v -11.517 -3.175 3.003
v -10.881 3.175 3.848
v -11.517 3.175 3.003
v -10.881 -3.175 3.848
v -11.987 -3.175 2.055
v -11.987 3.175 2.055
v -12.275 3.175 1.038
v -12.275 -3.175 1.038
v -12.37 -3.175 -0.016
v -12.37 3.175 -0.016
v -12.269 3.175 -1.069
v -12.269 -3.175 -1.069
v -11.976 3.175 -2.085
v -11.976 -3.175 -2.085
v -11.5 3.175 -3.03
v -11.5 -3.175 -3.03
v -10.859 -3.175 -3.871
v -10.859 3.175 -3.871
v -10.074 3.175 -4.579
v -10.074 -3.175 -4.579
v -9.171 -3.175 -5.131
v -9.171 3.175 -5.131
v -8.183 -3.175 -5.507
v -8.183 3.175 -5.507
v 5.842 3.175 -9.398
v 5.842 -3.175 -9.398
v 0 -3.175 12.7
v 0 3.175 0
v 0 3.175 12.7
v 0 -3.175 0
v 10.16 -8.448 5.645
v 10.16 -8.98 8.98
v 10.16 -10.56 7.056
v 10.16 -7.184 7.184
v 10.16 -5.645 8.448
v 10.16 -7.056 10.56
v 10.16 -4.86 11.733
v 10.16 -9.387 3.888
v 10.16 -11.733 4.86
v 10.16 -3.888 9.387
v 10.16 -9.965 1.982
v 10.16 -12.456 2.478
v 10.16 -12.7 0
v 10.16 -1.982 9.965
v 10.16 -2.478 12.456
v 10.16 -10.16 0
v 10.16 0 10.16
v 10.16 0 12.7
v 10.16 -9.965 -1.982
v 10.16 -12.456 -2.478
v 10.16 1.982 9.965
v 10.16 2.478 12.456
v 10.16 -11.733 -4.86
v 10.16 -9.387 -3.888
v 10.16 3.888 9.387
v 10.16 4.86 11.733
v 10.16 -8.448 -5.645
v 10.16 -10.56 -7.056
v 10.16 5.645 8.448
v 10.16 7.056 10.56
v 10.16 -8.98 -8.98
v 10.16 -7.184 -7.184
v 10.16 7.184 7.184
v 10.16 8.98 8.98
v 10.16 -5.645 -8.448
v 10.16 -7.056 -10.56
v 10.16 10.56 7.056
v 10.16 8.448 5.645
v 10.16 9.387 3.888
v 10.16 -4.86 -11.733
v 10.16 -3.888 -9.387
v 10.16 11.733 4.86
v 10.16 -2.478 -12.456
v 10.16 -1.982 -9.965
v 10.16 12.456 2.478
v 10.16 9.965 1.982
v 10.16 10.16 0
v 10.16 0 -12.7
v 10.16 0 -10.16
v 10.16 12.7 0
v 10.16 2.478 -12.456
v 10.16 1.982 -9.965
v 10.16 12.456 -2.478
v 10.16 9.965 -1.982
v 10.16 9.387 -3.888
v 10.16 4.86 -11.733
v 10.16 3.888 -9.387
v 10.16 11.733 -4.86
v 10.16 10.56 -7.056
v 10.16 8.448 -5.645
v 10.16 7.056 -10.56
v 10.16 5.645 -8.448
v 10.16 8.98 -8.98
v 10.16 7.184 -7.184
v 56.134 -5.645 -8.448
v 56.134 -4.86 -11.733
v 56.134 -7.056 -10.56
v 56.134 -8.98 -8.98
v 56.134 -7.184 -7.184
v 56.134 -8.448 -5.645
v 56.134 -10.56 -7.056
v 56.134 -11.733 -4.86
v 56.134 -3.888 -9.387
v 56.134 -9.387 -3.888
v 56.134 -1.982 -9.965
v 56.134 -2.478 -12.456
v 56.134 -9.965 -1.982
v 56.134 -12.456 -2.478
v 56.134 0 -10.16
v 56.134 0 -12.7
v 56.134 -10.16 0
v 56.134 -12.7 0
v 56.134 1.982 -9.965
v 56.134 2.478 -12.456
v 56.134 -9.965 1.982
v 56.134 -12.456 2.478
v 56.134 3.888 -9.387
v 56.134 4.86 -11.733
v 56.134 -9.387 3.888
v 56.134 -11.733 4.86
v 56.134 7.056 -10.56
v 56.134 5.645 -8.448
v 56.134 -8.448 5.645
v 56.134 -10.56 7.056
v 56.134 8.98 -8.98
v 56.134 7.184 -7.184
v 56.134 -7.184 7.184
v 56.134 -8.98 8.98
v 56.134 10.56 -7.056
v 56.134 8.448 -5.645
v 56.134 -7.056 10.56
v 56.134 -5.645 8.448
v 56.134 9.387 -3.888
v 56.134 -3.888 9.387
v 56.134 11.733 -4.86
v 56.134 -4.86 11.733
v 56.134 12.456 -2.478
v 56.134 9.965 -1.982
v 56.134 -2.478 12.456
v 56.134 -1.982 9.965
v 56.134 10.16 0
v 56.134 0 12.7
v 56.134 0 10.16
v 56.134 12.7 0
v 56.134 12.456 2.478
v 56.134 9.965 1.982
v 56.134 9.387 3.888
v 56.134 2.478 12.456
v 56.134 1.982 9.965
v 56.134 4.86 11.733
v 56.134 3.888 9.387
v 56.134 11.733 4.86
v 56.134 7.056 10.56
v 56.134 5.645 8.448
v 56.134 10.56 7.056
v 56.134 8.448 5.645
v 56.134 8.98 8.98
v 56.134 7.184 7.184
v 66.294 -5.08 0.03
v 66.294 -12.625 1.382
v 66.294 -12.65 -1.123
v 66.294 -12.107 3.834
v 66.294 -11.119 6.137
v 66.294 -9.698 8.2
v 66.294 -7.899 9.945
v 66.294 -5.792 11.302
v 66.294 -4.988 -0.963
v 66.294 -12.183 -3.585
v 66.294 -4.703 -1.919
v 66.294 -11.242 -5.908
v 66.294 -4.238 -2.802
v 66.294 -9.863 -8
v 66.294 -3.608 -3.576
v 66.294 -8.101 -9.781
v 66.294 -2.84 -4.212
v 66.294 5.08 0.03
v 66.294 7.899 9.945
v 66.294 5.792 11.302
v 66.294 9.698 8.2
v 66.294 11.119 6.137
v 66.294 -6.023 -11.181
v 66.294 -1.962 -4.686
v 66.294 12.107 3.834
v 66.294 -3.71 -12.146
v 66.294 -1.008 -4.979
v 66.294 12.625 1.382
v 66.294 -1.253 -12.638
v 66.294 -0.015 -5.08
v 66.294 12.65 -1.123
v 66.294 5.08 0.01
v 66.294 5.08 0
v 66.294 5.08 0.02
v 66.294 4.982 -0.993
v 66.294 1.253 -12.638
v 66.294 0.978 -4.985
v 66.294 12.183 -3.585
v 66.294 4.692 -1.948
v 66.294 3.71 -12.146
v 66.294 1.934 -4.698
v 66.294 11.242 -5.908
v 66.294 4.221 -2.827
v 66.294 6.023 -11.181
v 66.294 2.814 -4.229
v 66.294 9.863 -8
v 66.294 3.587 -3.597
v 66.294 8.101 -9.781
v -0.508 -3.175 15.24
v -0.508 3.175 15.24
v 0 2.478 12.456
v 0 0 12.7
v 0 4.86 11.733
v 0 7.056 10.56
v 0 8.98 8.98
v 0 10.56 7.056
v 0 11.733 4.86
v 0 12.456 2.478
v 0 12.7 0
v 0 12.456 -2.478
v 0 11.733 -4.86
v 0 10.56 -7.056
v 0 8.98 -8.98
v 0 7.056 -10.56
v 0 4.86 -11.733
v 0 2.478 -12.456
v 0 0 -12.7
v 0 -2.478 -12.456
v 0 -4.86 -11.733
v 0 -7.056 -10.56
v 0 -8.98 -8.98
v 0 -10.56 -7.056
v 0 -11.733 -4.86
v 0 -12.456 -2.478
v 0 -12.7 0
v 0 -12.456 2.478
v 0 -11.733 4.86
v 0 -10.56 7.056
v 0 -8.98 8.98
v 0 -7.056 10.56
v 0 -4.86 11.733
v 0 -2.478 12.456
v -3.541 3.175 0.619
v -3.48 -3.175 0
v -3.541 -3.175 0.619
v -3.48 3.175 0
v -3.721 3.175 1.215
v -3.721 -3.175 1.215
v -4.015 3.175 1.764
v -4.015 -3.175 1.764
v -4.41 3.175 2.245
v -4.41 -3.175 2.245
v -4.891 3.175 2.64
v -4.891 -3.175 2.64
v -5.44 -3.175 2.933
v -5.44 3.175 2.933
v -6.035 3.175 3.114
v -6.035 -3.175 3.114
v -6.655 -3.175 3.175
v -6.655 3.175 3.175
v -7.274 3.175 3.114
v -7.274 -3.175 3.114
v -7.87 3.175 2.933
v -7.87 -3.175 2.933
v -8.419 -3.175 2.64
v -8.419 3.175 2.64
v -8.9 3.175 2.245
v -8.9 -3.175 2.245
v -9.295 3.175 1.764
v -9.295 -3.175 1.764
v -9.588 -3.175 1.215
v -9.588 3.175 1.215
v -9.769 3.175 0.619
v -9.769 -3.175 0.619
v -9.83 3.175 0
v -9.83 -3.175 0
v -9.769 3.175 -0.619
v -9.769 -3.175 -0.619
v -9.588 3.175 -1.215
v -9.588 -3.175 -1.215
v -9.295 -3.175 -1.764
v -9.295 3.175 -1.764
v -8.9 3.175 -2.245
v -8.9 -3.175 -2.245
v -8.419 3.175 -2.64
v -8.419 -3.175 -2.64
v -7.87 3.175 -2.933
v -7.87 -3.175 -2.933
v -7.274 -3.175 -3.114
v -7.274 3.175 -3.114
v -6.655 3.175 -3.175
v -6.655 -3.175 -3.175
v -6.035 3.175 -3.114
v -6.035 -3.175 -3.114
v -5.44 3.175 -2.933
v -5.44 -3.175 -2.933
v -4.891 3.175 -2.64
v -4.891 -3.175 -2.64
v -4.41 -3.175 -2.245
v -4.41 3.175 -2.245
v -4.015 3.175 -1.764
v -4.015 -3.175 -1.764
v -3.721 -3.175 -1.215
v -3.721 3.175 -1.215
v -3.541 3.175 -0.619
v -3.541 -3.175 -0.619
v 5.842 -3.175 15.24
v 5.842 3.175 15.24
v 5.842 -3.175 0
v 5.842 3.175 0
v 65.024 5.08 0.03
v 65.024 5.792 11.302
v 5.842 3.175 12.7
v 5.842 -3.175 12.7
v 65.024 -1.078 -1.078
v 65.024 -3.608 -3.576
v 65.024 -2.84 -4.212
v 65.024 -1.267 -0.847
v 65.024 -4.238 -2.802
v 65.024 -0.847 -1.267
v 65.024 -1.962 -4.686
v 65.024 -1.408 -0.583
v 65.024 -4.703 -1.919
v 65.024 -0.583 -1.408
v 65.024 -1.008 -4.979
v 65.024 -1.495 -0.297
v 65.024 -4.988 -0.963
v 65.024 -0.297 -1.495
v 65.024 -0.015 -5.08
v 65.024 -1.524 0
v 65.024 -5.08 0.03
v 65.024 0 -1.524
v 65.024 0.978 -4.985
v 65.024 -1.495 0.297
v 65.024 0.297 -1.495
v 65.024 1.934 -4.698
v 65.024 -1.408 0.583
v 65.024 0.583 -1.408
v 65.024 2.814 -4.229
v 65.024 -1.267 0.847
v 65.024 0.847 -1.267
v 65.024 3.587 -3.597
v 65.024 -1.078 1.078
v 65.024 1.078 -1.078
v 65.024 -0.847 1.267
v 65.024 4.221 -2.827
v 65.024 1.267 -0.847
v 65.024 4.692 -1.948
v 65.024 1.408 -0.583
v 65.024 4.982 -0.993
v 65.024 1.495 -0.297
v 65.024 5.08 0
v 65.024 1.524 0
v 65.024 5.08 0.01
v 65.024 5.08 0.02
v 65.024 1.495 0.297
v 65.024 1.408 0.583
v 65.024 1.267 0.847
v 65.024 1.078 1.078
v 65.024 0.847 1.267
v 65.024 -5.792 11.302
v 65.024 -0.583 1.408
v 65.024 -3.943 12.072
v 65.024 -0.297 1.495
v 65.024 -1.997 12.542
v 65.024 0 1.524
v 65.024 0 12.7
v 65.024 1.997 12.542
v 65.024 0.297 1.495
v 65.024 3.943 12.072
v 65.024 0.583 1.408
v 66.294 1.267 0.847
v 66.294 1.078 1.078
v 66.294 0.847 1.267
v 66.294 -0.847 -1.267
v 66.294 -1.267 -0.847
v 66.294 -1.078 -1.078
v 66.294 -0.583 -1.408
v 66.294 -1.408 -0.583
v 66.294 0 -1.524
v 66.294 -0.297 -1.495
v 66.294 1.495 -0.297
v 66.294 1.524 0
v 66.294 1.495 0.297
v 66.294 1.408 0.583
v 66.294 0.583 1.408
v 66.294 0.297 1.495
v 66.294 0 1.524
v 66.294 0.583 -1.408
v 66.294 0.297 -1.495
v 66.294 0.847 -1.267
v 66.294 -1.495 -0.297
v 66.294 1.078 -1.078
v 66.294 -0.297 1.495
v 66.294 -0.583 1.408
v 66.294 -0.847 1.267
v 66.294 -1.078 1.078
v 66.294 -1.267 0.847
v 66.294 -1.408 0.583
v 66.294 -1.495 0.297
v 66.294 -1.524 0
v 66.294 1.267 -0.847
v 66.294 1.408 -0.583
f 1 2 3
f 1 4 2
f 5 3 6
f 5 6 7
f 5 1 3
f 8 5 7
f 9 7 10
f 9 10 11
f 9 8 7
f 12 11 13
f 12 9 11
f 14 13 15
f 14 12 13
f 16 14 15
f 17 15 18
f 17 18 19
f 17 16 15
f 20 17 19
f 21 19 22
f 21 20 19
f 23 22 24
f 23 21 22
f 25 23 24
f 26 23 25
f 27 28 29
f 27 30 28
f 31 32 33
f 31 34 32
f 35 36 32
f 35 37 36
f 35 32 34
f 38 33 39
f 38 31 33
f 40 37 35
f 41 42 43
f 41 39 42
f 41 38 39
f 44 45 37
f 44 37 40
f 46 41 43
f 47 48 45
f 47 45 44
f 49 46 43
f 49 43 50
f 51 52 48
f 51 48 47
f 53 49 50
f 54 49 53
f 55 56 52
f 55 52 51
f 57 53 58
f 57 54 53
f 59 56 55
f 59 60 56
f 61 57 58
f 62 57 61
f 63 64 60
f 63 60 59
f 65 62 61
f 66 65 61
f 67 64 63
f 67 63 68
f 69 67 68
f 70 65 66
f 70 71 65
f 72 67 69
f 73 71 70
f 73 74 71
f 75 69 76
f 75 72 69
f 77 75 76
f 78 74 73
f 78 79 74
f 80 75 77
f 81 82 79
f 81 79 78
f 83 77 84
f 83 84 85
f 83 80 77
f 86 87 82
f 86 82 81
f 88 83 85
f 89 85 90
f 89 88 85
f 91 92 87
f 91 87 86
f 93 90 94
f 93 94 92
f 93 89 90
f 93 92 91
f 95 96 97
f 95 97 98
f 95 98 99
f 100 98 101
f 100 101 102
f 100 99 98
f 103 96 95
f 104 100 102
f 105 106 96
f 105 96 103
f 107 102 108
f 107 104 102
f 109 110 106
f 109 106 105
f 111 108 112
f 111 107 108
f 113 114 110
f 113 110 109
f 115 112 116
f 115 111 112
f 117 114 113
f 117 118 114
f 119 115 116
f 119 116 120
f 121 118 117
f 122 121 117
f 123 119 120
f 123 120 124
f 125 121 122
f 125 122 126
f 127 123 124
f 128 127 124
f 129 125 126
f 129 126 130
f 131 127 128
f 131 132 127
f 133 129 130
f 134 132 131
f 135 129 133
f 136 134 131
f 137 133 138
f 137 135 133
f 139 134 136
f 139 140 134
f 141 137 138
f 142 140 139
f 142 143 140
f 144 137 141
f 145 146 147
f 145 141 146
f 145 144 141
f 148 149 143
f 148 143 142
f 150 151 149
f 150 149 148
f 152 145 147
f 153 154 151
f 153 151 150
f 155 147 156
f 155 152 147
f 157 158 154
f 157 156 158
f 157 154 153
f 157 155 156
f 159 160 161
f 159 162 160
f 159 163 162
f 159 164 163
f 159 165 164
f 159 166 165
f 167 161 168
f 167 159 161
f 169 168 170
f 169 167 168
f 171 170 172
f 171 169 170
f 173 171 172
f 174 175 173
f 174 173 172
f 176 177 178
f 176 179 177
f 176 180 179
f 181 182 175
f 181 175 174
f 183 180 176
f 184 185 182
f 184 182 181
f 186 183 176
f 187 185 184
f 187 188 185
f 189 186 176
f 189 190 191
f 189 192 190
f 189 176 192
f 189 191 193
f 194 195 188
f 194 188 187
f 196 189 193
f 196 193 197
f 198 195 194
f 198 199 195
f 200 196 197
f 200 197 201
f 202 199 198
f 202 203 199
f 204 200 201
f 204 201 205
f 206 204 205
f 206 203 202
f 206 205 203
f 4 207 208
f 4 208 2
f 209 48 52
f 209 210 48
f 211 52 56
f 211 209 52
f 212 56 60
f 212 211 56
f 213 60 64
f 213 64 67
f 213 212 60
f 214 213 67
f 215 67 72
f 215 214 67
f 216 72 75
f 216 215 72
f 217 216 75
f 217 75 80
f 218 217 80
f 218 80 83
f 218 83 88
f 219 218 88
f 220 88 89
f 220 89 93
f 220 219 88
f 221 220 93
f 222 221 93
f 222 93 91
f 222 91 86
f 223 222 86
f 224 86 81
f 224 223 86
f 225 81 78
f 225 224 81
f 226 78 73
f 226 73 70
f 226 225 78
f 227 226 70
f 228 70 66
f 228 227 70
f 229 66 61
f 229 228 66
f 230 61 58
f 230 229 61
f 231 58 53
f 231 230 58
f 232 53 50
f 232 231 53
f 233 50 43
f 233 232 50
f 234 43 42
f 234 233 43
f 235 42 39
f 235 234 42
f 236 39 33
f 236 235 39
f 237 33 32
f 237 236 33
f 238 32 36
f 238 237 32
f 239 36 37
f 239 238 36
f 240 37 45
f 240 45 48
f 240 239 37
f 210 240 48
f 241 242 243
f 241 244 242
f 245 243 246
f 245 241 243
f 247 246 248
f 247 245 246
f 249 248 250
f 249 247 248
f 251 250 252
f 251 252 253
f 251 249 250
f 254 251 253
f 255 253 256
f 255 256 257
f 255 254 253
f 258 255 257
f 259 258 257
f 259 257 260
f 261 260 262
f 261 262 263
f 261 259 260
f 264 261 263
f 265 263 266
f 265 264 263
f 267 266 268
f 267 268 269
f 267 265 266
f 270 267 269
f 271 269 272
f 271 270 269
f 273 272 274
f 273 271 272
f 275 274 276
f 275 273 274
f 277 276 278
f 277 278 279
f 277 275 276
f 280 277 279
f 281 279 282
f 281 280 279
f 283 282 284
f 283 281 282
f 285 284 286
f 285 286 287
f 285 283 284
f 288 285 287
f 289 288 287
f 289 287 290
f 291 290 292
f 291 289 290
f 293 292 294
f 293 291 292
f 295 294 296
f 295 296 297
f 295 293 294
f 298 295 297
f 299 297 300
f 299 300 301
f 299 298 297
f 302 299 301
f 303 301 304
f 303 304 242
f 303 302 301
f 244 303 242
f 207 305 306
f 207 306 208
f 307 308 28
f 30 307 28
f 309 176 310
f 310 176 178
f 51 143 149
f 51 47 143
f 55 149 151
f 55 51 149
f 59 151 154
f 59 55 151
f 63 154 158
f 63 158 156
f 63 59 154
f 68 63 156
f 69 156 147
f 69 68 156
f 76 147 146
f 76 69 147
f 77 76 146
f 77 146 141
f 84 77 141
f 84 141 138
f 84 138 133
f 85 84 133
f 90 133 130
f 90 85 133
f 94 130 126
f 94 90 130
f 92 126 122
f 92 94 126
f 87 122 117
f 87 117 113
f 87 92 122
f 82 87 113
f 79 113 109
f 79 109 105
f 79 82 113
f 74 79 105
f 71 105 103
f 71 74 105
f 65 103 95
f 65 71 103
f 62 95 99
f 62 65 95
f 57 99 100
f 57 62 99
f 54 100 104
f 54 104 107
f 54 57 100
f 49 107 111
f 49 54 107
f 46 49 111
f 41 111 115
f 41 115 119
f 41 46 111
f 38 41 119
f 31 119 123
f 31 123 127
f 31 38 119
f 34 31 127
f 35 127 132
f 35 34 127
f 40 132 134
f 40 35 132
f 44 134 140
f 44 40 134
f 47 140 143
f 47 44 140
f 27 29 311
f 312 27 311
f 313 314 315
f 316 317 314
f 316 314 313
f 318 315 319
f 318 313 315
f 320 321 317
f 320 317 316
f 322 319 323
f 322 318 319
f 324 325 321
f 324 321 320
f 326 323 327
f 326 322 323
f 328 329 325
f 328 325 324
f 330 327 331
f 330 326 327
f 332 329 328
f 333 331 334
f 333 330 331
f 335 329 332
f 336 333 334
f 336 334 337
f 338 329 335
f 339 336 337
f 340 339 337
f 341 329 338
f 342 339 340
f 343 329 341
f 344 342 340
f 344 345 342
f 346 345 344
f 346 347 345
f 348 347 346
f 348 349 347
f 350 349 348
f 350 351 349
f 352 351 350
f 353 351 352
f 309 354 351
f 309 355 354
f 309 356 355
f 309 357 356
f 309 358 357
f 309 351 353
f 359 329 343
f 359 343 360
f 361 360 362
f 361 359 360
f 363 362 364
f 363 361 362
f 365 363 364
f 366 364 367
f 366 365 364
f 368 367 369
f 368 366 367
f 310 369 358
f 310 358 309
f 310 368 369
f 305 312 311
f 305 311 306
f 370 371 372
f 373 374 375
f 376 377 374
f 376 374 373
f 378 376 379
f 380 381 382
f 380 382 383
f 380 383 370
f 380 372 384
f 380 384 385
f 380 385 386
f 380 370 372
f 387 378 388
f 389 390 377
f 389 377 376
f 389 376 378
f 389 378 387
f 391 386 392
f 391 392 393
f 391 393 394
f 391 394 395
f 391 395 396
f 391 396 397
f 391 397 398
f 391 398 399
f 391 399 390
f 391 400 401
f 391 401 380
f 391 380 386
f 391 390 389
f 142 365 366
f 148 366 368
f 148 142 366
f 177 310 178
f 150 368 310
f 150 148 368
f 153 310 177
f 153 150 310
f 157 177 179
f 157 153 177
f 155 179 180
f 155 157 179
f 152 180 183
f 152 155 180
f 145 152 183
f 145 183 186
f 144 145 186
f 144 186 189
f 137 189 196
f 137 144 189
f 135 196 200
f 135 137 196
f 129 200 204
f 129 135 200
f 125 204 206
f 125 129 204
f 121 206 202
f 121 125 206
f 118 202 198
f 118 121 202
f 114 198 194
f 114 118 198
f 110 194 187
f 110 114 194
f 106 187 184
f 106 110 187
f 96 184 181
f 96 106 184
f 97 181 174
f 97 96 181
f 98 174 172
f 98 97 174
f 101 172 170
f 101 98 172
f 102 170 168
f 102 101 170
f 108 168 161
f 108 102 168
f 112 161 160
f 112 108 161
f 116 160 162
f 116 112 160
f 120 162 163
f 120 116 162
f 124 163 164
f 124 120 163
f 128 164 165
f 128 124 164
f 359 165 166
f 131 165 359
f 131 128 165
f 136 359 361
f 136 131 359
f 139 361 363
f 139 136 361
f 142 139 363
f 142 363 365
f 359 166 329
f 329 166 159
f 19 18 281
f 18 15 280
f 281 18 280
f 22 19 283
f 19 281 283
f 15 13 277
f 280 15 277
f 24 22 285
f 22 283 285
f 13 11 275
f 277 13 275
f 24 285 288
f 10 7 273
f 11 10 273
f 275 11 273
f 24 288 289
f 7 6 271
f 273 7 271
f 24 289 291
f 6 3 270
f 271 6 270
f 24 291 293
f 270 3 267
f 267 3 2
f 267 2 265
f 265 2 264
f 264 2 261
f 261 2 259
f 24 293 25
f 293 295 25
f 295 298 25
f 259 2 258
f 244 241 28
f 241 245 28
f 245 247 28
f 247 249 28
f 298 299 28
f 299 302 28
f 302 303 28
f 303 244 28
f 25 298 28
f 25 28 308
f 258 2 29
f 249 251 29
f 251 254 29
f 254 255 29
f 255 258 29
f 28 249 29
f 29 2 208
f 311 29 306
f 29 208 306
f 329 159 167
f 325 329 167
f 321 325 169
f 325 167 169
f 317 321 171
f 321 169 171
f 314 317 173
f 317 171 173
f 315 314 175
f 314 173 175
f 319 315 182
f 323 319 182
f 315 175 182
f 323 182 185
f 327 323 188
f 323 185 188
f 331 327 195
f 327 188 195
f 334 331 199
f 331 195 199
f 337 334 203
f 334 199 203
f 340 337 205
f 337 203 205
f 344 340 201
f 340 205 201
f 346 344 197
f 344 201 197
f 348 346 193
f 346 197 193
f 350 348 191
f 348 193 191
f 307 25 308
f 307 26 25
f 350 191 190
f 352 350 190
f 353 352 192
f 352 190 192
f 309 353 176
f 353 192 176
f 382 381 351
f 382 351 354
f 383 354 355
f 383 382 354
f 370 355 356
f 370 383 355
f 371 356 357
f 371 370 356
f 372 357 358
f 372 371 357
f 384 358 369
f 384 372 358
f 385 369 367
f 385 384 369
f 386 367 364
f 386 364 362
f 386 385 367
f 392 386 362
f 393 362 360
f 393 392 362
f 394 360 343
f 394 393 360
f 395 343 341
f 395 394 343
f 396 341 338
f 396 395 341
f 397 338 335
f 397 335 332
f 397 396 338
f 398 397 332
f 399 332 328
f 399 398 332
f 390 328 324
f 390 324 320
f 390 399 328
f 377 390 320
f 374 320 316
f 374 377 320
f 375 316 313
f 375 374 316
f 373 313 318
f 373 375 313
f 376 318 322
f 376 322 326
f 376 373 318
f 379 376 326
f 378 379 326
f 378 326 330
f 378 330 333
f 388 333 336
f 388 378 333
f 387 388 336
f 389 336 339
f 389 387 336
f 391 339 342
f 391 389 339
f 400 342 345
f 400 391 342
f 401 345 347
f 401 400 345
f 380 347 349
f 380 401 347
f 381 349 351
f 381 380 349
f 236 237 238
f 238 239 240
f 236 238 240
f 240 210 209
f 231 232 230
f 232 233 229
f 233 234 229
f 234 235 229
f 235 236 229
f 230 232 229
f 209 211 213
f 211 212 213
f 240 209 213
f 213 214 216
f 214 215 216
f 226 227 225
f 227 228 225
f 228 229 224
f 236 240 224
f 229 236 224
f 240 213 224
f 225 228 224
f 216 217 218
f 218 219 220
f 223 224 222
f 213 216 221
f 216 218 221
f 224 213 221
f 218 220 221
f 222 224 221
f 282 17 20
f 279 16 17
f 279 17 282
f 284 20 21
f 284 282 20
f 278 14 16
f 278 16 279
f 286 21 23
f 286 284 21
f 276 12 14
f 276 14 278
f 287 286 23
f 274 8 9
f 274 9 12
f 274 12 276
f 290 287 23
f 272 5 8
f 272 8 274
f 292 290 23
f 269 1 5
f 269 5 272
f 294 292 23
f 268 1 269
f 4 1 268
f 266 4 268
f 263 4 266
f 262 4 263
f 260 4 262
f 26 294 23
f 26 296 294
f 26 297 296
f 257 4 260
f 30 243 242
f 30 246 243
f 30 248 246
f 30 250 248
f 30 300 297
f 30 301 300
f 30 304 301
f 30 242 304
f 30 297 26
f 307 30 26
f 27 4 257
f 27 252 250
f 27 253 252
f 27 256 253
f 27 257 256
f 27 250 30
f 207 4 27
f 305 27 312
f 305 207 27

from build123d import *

# Parameters (mm, degrees)
F0_R     = 3.175
F1_DEPTH = 3.175
F0_W     = 5.842
F0_H     = 12.7
F3_R     = 1.524
F4_DEPTH = 1.27


with BuildPart() as f1:
    # F0 (on Front) → F1 (new body, symmetric)
    with BuildSketch(Plane.XZ):
        with BuildLine():
            Line((-0.9398, 0), (0, 0))
            Line((0, 0), (0, 12.7))
            Line((0, 12.7), (5.842, 12.7))
            Line((5.842, 12.7), (5.842, 15.24))
            Line((5.842, 15.24), (-0.508, 15.24))
            Line((-0.508, 15.24), (-10.8806298187, 3.8475430269))
            ThreePointArc((-10.8806298187, 3.8475430269), (-4.5919612295, 5.3297205562), (-0.9398, 0))
        make_face()
        with BuildLine():
            Line((5.842, 0), (0, 0))
            Line((0, 0), (-0.9398, 0))
            ThreePointArc((-0.9398, 0), (-3.1957909266, -4.5493385486), (-8.1826630726, -5.5069827884))
            Line((-8.1826630726, -5.5069827884), (5.842, -9.398))
            Line((5.842, -9.398), (5.842, 0))
        make_face()
        with BuildLine():
            ThreePointArc((-8.1826630726, -5.5069827884), (-3.1957909266, -4.5493385486), (-0.9398, 0))
            ThreePointArc((-0.9398, 0), (-4.5919612295, 5.3297205562), (-10.8806298187, 3.8475430269))
            ThreePointArc((-10.8806298187, 3.8475430269), (-12.1459778134, -1.5837270034), (-8.1826630726, -5.5069827884))
        make_face()
        with Locations((-6.6548, 0)):
            Circle(F0_R, mode=Mode.SUBTRACT)
    extrude(amount=F1_DEPTH, both=True)


with BuildPart() as f2:
    # F0 (on Front) → F2 (revolve)
    with BuildSketch(Plane.XZ):
        with Locations((2.921, 6.35)):
            Rectangle(F0_W, F0_H)
        Polygon((5.842, 12.7), (5.842, 0), (66.294, 0), (66.294, 12.7), (56.134, 12.7), (56.134, 10.16), (10.16, 10.16), (10.16, 12.7), align=None)
    revolve(axis=Axis((33.147, 0, 0), (-1, 0, 0)))

    # F3 (on face) → F4 (cut)
    with BuildSketch(Plane.YZ.offset(66.294)):
        with BuildLine():
            ThreePointArc((-5.792347252, 11.3021552508), (0, 12.7), (5.792347252, 11.3021552508))
            Line((5.792347252, 11.3021552508), (6.0412399471, 15.24))
            Line((6.0412399471, 15.24), (-6.0412399471, 15.24))
            Line((-6.0412399471, 15.24), (-5.792347252, 11.3021552508))
        make_face()
        with BuildLine():
            ThreePointArc((-5.0799093356, 0.0303503178), (0, 5.08), (5.0799093356, 0.0303503178))
            Line((5.0799093356, 0.0303503178), (5.792347252, 11.3021552508))
            ThreePointArc((5.792347252, 11.3021552508), (0, 12.7), (-5.792347252, 11.3021552508))
            Line((-5.792347252, 11.3021552508), (-5.0799093356, 0.0303503178))
        make_face()
        with BuildLine():
            ThreePointArc((-5.0799093356, 0.0303503178), (-0.0151752266, -5.0799773339), (5.08, 0))
            ThreePointArc((5.08, 0), (5.0799773339, 0.0151752266), (5.0799093356, 0.0303503178))
            ThreePointArc((5.0799093356, 0.0303503178), (0, 5.08), (-5.0799093356, 0.0303503178))
        make_face()
        Circle(F3_R, mode=Mode.SUBTRACT)
    extrude(amount=-F4_DEPTH, mode=Mode.SUBTRACT)


solid = Compound([f1.part, f2.part])
